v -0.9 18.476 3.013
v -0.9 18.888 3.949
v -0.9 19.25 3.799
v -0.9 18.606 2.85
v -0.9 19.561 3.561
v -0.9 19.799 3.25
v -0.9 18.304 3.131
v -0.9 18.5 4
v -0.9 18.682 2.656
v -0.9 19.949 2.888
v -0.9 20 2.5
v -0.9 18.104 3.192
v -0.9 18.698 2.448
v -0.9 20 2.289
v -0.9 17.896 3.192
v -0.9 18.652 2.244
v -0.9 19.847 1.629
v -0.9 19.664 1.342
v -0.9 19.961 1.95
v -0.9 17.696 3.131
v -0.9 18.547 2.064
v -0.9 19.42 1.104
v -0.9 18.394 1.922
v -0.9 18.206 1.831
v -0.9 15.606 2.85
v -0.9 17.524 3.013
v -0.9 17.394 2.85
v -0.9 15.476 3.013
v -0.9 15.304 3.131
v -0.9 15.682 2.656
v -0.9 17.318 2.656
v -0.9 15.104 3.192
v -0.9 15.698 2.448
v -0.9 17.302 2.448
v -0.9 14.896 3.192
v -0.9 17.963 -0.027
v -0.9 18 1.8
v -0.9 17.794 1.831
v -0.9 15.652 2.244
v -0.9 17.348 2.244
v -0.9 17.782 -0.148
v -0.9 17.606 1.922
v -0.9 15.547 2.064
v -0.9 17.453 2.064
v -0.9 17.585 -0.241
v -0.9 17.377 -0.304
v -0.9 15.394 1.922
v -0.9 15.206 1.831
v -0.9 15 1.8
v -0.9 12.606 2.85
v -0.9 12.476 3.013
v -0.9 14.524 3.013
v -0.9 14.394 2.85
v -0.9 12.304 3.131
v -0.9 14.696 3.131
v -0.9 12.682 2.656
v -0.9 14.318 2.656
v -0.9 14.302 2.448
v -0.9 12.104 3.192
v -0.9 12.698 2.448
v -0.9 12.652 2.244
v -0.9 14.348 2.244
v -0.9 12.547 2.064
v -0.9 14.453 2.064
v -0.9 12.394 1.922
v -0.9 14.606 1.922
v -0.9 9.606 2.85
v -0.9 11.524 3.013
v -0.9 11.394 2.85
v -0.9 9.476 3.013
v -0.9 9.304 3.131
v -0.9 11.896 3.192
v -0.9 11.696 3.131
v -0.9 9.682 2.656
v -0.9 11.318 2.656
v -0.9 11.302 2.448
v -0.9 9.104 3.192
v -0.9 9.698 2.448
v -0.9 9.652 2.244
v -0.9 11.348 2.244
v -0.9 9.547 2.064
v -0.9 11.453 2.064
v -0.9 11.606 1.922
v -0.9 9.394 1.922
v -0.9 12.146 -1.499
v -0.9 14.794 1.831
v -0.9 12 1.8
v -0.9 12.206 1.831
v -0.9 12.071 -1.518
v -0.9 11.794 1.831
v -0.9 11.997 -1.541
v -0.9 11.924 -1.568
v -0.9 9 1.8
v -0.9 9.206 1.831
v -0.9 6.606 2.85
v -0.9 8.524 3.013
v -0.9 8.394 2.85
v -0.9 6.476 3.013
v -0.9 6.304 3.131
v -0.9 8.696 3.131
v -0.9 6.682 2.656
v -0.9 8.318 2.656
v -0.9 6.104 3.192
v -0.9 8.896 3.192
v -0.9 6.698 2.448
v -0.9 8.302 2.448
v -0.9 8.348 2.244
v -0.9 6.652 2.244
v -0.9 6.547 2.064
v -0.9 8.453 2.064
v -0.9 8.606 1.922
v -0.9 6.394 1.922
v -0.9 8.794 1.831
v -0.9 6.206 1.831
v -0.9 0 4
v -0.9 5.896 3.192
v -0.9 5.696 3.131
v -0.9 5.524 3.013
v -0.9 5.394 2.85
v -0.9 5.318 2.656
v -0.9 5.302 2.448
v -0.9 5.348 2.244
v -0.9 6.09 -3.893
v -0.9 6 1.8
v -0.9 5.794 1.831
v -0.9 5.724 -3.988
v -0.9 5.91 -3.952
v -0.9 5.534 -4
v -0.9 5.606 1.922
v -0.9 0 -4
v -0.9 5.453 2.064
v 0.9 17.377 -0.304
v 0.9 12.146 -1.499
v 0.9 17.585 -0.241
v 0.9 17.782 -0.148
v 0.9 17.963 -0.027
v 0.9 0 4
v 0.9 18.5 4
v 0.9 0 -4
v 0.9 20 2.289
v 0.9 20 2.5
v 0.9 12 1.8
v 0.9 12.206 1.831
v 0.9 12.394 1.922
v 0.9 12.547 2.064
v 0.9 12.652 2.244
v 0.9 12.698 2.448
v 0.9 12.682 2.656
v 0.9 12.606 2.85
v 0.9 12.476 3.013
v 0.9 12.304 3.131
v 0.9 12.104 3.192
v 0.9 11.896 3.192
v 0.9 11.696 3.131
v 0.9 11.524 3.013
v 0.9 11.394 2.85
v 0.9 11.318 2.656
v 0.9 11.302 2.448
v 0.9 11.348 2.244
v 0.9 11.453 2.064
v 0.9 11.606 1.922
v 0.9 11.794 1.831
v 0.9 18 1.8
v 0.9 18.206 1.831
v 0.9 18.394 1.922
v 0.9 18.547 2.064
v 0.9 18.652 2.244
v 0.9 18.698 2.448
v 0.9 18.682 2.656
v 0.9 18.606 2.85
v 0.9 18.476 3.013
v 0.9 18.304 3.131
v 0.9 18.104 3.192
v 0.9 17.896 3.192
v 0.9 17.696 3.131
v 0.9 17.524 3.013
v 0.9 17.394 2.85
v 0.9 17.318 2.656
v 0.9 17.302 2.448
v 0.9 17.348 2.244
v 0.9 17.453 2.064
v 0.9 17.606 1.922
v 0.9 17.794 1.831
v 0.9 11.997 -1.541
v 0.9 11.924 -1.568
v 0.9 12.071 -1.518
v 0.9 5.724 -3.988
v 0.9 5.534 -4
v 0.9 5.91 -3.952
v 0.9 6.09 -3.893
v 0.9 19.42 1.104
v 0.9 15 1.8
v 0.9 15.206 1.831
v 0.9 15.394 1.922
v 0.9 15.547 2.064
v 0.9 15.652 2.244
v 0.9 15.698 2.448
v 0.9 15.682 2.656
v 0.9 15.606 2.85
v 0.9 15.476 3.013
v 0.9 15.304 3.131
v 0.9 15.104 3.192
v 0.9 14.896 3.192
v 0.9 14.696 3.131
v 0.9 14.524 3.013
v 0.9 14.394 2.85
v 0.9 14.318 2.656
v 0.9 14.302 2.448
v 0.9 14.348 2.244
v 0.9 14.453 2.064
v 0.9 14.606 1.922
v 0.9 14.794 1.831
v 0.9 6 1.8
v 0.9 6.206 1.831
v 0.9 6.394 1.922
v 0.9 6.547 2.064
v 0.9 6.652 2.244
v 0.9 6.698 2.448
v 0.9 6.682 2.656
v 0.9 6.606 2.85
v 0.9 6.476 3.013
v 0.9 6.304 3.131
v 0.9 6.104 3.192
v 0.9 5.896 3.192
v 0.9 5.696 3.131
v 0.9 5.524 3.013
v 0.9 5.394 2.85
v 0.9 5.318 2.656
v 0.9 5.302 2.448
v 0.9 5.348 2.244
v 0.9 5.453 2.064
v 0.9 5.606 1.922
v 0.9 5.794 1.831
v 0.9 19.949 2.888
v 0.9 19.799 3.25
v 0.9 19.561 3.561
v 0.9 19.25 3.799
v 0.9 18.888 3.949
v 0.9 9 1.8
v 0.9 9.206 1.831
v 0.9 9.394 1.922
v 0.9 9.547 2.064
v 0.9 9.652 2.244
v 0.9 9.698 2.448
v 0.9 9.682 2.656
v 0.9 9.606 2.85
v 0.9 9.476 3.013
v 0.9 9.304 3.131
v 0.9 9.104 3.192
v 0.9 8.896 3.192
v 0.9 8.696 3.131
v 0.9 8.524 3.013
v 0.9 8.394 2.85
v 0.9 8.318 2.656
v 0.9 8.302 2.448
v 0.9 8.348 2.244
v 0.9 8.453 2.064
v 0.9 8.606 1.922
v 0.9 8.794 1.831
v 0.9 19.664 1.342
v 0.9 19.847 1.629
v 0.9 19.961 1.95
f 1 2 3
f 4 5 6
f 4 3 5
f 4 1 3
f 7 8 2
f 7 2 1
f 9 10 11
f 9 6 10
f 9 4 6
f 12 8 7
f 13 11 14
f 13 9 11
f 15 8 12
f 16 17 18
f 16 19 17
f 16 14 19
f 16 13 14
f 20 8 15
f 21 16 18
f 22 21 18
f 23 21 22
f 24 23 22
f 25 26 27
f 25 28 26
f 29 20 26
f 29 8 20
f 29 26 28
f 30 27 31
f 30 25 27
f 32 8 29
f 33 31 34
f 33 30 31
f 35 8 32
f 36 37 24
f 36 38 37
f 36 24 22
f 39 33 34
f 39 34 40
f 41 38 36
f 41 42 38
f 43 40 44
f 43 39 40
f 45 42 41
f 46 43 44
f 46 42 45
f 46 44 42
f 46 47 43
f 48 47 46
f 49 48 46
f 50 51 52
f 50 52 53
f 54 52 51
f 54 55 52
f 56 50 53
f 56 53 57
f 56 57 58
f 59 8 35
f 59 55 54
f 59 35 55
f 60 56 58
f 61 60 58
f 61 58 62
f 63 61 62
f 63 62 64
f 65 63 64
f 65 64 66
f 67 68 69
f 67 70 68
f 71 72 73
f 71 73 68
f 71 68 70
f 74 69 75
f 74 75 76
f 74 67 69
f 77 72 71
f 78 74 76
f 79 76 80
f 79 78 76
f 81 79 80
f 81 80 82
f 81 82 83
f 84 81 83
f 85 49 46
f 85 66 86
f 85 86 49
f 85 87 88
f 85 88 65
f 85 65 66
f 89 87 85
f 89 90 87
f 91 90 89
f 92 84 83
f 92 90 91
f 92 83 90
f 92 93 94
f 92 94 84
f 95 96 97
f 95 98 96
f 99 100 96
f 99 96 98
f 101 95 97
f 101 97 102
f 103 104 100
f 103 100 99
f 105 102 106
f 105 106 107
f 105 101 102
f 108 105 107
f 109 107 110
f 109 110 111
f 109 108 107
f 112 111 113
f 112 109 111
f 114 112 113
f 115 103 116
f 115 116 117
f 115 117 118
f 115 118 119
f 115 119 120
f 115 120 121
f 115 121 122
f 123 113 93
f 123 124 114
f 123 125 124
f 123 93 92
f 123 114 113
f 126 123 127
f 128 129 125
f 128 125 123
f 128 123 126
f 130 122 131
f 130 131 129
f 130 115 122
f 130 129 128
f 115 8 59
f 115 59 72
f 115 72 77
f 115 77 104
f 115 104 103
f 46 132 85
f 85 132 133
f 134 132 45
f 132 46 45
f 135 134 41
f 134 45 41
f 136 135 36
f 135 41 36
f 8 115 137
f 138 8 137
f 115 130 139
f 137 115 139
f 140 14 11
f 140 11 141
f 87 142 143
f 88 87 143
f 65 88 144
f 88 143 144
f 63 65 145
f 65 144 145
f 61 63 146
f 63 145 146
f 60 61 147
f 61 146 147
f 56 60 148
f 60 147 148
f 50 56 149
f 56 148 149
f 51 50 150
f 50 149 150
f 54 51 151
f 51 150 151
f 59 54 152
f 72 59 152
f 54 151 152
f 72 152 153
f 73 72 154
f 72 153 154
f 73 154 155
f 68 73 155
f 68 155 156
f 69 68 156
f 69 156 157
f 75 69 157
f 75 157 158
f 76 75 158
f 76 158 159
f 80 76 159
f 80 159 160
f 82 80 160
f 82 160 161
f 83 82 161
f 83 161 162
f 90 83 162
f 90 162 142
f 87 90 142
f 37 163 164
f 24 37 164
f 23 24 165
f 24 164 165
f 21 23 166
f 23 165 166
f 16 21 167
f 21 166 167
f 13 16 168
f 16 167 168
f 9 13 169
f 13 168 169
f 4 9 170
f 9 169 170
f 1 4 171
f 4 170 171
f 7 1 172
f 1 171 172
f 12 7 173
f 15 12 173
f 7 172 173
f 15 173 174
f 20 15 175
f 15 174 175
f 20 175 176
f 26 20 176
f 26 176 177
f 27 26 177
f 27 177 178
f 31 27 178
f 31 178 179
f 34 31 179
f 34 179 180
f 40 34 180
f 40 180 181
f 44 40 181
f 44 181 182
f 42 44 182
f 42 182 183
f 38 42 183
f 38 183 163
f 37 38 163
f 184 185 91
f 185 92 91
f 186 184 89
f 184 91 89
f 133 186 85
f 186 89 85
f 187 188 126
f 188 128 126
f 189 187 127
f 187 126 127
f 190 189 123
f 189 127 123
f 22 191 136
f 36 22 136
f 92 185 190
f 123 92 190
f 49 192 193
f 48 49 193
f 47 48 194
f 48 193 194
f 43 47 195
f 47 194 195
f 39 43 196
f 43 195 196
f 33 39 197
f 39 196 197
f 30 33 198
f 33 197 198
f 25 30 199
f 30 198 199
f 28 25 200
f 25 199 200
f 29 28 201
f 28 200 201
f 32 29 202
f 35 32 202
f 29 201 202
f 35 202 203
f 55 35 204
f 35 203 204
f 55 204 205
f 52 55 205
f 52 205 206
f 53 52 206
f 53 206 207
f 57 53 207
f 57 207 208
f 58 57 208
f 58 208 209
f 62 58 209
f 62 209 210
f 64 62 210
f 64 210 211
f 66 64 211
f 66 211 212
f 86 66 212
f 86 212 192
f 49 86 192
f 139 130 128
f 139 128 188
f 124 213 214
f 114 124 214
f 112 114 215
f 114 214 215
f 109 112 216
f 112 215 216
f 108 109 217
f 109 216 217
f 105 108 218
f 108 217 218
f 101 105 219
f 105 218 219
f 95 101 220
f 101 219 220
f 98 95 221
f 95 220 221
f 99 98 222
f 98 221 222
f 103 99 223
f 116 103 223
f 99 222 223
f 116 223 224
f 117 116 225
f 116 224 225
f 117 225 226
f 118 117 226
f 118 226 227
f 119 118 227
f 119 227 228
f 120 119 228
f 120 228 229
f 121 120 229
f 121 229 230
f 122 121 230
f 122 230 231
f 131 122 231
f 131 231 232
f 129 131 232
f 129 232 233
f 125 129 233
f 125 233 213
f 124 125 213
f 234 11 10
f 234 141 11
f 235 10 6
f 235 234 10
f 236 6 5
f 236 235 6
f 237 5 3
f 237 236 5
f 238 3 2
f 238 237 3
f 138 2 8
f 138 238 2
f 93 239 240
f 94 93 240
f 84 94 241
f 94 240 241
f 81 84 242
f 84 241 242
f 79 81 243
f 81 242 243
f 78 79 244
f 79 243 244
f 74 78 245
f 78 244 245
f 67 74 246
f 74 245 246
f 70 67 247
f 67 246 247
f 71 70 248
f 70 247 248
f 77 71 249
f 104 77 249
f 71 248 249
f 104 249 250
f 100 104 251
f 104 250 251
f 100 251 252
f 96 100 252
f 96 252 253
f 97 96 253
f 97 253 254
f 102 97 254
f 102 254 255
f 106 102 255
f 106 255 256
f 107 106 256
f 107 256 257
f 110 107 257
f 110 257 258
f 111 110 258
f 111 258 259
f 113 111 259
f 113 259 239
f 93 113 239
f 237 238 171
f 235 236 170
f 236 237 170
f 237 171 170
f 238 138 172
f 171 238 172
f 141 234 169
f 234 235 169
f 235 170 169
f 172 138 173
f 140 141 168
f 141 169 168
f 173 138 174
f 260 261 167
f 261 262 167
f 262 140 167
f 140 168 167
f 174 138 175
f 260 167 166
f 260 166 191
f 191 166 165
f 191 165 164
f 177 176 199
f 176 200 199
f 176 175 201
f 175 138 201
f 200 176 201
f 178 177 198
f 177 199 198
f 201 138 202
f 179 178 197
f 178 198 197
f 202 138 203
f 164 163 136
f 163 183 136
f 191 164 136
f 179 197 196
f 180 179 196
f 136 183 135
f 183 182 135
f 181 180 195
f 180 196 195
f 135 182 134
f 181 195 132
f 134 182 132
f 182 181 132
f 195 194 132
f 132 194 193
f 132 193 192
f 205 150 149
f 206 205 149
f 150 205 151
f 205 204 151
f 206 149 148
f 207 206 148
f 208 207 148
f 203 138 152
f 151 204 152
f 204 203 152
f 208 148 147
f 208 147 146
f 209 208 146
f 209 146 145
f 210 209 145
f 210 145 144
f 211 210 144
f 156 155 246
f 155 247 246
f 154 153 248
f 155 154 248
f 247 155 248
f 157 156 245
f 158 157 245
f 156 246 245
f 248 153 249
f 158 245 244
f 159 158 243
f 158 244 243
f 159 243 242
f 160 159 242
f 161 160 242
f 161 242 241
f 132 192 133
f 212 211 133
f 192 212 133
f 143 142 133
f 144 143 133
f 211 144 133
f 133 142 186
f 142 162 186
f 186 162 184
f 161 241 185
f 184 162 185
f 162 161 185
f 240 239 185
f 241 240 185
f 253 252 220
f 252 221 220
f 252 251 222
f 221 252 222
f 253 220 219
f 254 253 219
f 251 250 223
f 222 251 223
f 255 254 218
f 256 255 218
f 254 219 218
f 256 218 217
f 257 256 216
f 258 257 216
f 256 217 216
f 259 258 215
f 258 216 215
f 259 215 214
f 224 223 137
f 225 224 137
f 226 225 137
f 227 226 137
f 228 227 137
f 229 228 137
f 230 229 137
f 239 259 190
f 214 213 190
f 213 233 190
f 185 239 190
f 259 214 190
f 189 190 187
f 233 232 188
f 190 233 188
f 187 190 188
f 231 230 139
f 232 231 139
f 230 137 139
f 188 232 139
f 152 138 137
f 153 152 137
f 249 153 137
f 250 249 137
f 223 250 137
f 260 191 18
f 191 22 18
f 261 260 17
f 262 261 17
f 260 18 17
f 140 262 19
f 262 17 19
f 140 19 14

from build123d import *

# Parameters (mm, degrees)
SKETCH_1_W          = 1.8
SKETCH_1_H          = 8
EXTRUDE_1_DEPTH     = 20
SKETCH_3_R          = 0.7
CUT_EXTRUDE_1_DEPTH = 20
FILLET_1_R          = 1.5


with BuildPart() as part:
    # 草圖1 → 填料-伸長1 (new body)
    with BuildSketch(Plane(origin=(0, 0, 0), x_dir=(1, 0, 0), z_dir=(0, 1, 0))):
        Rectangle(SKETCH_1_W, SKETCH_1_H)
    extrude(amount=EXTRUDE_1_DEPTH)

    # 草圖3 → 除料-伸長1 (cut)
    with BuildSketch(Plane(origin=(0.9, 0, 0), x_dir=(0, 0, -1), z_dir=(1, 0, 0))):
        with Locations((-2.5, 18)):
            Circle(SKETCH_3_R)
        with Locations((-2.5, 15)):
            Circle(SKETCH_3_R)
        with Locations((-2.5, 12)):
            Circle(SKETCH_3_R)
        with Locations((-2.5, 9)):
            Circle(SKETCH_3_R)
        with Locations((-2.5, 6)):
            Circle(SKETCH_3_R)
        Polygon((-1.554314994, 20), (0.230558493, 17.700704895), (1.525082121, 12.032260524), (4, 5.822351238), (4, 20), align=None)
    extrude(amount=-CUT_EXTRUDE_1_DEPTH, mode=Mode.SUBTRACT)

    # 圓角1
    fillet_1_edges = [part.edges().sort_by_distance(p)[0] for p in [
        (0, 20, 1.554314994),
        (0, 12.032260524, -1.525082121),
        (0, 5.822351238, -4),
        (0, 17.700704895, -0.230558493),
        (0, 20, 4),
    ]]
    fillet(fillet_1_edges, radius=FILLET_1_R)


solid = part.part
